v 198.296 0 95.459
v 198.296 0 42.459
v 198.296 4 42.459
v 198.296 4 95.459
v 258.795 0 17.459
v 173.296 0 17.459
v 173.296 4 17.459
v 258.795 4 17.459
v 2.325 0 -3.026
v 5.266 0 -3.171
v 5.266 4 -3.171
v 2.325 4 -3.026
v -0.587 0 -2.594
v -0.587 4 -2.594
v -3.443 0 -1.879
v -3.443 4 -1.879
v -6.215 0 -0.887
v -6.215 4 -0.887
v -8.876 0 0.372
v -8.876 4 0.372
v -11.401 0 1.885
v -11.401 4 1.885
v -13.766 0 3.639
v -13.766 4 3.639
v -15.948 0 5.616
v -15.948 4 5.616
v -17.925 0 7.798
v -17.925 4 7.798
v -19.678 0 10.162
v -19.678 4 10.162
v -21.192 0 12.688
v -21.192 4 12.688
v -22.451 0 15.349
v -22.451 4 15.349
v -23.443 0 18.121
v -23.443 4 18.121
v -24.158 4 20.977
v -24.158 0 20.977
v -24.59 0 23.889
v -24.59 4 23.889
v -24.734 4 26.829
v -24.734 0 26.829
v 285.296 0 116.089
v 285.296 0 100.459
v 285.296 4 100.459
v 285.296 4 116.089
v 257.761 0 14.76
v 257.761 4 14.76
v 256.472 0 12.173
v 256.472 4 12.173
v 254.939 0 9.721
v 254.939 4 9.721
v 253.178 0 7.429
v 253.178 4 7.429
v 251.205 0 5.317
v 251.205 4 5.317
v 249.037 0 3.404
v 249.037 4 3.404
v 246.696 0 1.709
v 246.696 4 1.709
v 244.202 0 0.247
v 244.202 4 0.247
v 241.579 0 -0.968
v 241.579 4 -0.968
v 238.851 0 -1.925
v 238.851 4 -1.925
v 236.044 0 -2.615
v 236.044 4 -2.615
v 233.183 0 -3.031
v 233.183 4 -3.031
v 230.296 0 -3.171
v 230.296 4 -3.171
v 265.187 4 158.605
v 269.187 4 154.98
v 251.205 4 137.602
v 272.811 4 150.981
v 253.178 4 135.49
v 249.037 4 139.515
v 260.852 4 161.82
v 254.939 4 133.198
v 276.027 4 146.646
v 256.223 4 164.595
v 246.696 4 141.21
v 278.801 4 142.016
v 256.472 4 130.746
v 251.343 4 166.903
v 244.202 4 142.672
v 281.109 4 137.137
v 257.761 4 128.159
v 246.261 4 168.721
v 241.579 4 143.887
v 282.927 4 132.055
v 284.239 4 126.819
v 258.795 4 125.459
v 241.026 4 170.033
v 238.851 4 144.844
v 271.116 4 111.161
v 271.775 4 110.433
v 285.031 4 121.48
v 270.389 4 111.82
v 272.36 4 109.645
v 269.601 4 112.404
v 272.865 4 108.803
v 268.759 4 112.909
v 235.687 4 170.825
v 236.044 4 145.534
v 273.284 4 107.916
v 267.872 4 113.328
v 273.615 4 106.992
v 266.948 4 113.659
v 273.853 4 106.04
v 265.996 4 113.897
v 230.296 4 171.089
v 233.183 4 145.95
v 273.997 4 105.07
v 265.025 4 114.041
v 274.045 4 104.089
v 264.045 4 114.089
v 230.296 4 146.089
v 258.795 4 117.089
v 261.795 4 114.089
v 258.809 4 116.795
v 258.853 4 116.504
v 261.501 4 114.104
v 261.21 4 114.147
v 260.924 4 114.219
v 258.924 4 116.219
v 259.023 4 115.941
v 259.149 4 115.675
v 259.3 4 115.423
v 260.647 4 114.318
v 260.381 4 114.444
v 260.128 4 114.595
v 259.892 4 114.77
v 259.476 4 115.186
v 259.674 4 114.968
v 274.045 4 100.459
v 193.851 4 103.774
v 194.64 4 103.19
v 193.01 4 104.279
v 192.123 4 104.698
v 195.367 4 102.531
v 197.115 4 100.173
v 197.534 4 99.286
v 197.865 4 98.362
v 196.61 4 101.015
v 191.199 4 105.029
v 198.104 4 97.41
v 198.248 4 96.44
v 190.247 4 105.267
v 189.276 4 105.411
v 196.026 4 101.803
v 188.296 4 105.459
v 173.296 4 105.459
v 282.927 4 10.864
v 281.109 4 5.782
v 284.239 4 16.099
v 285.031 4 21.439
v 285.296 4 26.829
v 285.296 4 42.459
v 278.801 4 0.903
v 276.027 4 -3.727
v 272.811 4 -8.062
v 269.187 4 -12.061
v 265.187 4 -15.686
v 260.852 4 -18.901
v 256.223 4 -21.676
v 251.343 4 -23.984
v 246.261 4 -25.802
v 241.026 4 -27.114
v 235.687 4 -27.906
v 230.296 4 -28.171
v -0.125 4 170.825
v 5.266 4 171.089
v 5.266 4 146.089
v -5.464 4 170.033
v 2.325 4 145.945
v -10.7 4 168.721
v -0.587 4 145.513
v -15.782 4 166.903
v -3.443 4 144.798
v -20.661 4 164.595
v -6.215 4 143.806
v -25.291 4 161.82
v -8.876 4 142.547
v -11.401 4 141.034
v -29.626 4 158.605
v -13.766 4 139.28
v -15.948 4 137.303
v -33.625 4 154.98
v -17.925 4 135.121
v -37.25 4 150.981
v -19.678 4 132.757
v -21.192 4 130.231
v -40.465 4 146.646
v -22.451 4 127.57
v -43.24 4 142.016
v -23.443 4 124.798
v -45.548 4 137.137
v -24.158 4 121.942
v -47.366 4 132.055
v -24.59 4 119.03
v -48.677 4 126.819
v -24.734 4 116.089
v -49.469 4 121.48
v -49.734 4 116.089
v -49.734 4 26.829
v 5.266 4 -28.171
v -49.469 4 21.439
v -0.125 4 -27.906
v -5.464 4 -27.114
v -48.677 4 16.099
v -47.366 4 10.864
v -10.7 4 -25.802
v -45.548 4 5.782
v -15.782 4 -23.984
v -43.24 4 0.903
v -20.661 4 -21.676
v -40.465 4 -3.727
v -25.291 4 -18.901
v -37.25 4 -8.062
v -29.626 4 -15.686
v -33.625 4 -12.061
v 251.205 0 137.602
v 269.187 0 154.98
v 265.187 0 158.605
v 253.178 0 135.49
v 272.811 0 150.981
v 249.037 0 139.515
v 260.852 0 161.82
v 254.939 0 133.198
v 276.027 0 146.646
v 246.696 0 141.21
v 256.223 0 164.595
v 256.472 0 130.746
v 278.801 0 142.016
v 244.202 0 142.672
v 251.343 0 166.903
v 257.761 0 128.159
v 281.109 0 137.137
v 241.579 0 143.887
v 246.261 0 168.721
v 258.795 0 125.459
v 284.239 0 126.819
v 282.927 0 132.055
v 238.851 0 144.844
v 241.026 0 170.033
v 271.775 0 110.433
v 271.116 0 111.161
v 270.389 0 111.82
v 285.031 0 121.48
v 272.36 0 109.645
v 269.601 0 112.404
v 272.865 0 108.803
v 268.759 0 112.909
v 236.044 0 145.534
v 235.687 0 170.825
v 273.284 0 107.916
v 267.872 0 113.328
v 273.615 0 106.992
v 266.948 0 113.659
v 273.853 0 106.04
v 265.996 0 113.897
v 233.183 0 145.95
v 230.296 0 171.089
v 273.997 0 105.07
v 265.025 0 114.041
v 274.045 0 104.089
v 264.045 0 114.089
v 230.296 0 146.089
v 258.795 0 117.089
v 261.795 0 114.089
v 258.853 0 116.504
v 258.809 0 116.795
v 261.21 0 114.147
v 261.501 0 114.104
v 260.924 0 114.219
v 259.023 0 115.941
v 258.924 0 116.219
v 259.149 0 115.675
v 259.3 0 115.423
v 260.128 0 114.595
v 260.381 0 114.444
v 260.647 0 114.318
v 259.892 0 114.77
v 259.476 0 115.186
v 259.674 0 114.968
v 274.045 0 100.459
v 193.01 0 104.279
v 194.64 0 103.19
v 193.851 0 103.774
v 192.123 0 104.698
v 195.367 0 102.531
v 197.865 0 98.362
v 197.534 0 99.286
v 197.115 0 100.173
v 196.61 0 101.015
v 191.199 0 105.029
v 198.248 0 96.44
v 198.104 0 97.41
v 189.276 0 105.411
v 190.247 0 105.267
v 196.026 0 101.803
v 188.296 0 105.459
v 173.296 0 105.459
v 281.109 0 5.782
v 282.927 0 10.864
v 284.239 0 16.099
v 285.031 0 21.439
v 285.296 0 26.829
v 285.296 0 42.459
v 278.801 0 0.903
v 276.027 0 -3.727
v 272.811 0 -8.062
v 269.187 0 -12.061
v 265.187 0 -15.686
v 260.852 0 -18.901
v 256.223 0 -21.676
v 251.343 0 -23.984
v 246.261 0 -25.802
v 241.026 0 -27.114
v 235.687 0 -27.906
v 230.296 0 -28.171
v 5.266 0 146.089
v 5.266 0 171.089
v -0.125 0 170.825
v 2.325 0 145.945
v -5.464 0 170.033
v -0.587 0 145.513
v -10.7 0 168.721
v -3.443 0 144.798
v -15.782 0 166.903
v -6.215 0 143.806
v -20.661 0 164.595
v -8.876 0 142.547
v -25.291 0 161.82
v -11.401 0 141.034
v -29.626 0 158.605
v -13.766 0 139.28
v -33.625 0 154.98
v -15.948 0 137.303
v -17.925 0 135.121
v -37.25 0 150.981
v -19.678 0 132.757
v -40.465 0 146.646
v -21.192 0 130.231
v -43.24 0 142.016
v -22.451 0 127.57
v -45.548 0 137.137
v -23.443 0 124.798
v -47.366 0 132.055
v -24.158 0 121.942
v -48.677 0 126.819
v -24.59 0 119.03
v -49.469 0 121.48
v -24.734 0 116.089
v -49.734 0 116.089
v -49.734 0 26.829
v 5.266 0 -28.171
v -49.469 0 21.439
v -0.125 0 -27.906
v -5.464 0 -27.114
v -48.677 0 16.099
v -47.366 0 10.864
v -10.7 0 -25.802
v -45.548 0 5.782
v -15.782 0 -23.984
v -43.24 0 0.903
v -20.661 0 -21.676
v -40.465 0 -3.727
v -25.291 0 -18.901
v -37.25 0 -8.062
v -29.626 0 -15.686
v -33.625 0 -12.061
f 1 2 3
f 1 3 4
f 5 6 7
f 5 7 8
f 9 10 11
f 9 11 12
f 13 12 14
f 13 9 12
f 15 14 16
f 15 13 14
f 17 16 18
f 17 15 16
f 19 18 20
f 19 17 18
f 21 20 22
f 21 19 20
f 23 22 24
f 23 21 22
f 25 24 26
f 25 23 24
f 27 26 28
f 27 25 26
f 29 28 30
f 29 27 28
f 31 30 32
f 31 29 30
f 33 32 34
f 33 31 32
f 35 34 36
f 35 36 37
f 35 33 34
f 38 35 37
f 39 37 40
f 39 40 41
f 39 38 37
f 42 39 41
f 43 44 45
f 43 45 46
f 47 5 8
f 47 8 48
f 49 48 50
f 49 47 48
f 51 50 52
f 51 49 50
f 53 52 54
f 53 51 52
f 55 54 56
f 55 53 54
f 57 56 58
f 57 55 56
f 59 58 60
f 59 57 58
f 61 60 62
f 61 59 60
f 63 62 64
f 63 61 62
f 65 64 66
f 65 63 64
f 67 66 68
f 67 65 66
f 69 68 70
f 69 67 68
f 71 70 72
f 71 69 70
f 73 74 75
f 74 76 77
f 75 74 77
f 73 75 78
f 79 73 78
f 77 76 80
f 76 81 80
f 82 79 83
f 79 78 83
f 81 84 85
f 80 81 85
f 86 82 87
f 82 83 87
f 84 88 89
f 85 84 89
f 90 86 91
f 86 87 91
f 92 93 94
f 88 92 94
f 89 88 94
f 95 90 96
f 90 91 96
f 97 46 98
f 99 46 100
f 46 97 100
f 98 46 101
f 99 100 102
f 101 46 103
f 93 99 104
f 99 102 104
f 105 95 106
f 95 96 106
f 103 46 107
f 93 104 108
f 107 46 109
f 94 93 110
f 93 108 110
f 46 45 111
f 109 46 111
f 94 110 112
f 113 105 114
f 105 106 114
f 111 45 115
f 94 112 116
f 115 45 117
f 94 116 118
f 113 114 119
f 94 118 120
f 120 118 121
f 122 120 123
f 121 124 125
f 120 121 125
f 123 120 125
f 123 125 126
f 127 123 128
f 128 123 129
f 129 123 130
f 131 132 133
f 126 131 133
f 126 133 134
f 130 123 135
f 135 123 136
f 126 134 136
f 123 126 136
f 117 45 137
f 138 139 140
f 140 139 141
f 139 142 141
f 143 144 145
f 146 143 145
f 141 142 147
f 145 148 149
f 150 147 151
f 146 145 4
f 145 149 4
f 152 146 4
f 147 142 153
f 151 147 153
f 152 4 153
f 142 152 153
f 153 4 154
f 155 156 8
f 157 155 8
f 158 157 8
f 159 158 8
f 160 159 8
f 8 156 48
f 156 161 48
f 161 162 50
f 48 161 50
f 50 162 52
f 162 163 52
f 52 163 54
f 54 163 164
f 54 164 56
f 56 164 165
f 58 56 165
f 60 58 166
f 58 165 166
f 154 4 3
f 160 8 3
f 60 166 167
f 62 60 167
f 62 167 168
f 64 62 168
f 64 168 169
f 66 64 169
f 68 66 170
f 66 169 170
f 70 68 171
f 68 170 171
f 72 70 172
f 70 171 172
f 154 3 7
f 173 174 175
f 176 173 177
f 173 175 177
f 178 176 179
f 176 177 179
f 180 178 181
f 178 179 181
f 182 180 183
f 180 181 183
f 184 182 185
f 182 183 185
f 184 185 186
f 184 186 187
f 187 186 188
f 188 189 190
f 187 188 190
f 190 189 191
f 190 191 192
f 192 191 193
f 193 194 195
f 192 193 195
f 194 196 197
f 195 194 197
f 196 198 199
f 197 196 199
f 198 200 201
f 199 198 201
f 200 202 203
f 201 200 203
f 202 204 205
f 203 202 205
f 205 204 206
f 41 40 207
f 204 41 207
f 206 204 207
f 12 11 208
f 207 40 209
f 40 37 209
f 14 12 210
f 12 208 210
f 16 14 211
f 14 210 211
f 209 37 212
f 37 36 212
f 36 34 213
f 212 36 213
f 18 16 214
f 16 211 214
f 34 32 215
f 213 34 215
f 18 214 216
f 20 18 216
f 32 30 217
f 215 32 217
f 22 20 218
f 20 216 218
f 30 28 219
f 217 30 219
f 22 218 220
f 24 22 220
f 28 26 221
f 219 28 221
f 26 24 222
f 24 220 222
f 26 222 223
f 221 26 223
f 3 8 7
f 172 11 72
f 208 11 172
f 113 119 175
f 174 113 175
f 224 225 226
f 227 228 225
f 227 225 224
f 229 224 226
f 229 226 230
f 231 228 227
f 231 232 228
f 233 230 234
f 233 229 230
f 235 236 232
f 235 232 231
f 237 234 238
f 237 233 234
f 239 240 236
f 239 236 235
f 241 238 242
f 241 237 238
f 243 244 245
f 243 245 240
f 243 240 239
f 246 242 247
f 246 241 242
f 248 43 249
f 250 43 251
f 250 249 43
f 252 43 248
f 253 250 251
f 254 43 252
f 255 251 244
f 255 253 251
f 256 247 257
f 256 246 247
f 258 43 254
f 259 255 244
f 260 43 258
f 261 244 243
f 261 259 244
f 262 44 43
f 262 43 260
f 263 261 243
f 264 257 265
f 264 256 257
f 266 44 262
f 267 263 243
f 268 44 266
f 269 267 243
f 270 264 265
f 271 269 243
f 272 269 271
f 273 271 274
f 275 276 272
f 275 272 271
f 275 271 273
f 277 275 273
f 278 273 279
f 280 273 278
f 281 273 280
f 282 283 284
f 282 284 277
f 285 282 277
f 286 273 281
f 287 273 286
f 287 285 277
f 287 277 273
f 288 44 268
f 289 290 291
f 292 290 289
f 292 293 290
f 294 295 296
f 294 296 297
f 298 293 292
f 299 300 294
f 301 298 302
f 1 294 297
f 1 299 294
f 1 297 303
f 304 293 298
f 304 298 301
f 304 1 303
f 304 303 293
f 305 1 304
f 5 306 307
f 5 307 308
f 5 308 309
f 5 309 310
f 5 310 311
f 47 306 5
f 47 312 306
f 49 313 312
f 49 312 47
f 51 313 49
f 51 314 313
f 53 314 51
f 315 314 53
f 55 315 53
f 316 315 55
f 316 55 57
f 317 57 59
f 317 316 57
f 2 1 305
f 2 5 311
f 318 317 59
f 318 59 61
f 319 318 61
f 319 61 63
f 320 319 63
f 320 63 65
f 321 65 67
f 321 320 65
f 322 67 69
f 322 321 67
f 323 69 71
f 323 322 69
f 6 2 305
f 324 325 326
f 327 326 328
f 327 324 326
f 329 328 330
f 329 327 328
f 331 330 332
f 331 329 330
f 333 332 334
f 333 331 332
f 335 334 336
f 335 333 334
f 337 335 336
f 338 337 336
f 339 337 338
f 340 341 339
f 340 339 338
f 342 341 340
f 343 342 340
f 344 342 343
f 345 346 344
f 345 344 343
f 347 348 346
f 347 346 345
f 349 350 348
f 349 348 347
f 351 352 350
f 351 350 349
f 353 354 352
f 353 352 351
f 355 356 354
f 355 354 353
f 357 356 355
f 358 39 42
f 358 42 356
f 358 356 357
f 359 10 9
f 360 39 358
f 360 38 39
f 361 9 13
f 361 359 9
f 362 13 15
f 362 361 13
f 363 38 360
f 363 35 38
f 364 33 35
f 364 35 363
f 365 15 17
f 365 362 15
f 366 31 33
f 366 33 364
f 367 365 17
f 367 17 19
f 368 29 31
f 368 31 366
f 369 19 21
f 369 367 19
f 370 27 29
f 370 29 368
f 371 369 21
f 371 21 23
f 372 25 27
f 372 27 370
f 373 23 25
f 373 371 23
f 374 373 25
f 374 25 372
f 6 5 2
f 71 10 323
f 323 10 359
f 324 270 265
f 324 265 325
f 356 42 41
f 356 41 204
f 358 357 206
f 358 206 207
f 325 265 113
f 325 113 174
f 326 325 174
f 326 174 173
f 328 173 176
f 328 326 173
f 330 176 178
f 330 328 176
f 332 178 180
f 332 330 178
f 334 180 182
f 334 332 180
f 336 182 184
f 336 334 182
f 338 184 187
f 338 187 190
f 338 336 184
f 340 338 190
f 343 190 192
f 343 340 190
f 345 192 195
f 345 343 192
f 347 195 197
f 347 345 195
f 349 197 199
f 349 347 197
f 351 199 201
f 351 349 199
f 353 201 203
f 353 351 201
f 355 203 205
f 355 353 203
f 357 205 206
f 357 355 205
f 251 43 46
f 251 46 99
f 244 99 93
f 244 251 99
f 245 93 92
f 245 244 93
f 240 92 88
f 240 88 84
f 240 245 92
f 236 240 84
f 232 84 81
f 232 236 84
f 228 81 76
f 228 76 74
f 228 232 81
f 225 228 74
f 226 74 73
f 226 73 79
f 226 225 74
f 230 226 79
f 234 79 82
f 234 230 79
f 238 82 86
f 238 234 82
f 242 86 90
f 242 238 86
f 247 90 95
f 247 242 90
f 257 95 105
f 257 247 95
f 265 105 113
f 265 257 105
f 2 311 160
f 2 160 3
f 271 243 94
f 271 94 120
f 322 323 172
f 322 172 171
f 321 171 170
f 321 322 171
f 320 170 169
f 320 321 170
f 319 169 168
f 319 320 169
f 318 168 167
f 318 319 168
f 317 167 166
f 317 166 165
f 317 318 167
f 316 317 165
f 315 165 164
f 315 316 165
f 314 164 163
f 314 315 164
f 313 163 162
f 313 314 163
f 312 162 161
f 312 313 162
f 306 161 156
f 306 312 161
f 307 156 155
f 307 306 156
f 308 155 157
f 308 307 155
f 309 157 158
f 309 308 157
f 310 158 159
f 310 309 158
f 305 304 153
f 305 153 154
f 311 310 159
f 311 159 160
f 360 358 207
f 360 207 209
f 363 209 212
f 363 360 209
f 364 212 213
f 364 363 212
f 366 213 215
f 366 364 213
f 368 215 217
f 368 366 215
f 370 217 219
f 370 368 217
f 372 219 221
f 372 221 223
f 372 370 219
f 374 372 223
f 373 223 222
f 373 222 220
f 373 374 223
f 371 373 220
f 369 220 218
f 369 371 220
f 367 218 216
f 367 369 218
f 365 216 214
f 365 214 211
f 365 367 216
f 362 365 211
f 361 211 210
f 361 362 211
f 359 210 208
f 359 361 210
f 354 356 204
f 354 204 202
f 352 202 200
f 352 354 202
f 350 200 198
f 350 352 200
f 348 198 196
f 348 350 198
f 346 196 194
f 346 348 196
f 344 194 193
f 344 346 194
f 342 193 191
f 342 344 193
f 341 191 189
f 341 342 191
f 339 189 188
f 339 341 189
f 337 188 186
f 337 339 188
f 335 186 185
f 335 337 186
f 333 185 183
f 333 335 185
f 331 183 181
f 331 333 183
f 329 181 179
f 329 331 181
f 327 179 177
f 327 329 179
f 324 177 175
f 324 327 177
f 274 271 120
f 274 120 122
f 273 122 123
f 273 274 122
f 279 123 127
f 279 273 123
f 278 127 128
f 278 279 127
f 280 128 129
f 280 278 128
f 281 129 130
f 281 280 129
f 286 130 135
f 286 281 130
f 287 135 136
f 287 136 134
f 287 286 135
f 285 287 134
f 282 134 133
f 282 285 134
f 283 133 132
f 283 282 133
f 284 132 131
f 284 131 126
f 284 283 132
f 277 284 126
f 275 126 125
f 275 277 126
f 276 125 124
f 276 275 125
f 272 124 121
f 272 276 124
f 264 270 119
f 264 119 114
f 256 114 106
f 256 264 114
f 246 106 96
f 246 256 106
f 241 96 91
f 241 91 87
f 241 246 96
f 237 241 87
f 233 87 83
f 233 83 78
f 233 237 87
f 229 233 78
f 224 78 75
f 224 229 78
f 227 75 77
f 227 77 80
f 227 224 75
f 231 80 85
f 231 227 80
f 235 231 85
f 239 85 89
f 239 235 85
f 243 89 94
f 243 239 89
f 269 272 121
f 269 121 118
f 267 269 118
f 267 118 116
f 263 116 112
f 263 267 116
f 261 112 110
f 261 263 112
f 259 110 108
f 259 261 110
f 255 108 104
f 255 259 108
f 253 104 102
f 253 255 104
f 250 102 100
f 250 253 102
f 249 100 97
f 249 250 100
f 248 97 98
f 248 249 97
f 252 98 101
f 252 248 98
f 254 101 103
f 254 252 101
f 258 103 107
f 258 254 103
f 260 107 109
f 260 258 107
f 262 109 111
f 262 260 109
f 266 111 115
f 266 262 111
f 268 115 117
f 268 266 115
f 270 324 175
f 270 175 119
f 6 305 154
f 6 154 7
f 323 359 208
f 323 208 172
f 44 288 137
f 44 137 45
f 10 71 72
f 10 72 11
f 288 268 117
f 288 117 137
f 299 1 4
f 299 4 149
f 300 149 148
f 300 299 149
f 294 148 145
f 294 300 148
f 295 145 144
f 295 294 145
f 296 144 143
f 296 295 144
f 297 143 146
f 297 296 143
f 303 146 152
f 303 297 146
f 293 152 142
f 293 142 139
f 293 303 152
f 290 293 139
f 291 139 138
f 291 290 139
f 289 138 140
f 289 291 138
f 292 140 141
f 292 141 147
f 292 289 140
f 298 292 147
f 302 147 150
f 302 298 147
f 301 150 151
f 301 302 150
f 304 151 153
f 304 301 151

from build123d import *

# Parameters (mm, degrees)
BOSS_EXTRUDE1_DEPTH = 4


with BuildPart() as part:
    # Sketch1 → Boss-Extrude1 (new body)
    with BuildSketch(Plane(origin=(0, 0, 0), x_dir=(1, 0, 0), z_dir=(0, 1, 0))):
        with BuildLine():
            Line((285.295698998, -100.459464193), (285.295698998, -116.089464193))
            ThreePointArc((285.295698998, -116.089464193), (269.186571963, -154.980337158), (230.295698998, -171.089464193))
            Line((230.295698998, -171.089464193), (5.265698998, -171.089464193))
            ThreePointArc((5.265698998, -171.089464193), (-33.625173967, -154.980337158), (-49.734301002, -116.089464193))
            Line((-49.734301002, -116.089464193), (-49.734301002, -26.829464193))
            ThreePointArc((-49.734301002, -26.829464193), (-33.625173967, 12.061408773), (5.265698998, 28.170535807))
            Line((5.265698998, 28.170535807), (230.295698998, 28.170535807))
            ThreePointArc((230.295698998, 28.170535807), (269.186571963, 12.061408773), (285.295698998, -26.829464193))
            Line((285.295698998, -26.829464193), (285.295698998, -42.459464193))
            Line((285.295698998, -42.459464193), (198.295698998, -42.459464193))
            Line((198.295698998, -42.459464193), (198.295698998, -95.459464193))
            ThreePointArc((198.295698998, -95.459464193), (195.36676681, -102.530532004), (188.295698998, -105.459464193))
            Line((188.295698998, -105.459464193), (173.295698998, -105.459464193))
            Line((173.295698998, -105.459464193), (173.295698998, -17.459464193))
            Line((173.295698998, -17.459464193), (258.794876179, -17.459464193))
            ThreePointArc((258.794876179, -17.459464193), (247.886889975, -2.528229656), (230.295698998, 3.170535807))
            Line((230.295698998, 3.170535807), (5.265698998, 3.170535807))
            ThreePointArc((5.265698998, 3.170535807), (-15.947504438, -5.616260757), (-24.734301002, -26.829464193))
            Line((-24.734301002, -26.829464193), (-24.734301002, -116.089464193))
            ThreePointArc((-24.734301002, -116.089464193), (-15.947504438, -137.302667628), (5.265698998, -146.089464193))
            Line((5.265698998, -146.089464193), (230.295698998, -146.089464193))
            ThreePointArc((230.295698998, -146.089464193), (247.886889975, -140.390698729), (258.794876179, -125.459464193))
            Line((258.794876179, -125.459464193), (258.794876179, -117.089464193))
            ThreePointArc((258.794876179, -117.089464193), (259.673555836, -114.968143849), (261.794876179, -114.089464193))
            Line((261.794876179, -114.089464193), (264.045287589, -114.089464193))
            ThreePointArc((264.045287589, -114.089464193), (271.1163554, -111.160532004), (274.045287589, -104.089464193))
            Line((274.045287589, -104.089464193), (274.045287589, -100.459464193))
            Line((274.045287589, -100.459464193), (285.295698998, -100.459464193))
        make_face()
    extrude(amount=BOSS_EXTRUDE1_DEPTH)


solid = part.part
